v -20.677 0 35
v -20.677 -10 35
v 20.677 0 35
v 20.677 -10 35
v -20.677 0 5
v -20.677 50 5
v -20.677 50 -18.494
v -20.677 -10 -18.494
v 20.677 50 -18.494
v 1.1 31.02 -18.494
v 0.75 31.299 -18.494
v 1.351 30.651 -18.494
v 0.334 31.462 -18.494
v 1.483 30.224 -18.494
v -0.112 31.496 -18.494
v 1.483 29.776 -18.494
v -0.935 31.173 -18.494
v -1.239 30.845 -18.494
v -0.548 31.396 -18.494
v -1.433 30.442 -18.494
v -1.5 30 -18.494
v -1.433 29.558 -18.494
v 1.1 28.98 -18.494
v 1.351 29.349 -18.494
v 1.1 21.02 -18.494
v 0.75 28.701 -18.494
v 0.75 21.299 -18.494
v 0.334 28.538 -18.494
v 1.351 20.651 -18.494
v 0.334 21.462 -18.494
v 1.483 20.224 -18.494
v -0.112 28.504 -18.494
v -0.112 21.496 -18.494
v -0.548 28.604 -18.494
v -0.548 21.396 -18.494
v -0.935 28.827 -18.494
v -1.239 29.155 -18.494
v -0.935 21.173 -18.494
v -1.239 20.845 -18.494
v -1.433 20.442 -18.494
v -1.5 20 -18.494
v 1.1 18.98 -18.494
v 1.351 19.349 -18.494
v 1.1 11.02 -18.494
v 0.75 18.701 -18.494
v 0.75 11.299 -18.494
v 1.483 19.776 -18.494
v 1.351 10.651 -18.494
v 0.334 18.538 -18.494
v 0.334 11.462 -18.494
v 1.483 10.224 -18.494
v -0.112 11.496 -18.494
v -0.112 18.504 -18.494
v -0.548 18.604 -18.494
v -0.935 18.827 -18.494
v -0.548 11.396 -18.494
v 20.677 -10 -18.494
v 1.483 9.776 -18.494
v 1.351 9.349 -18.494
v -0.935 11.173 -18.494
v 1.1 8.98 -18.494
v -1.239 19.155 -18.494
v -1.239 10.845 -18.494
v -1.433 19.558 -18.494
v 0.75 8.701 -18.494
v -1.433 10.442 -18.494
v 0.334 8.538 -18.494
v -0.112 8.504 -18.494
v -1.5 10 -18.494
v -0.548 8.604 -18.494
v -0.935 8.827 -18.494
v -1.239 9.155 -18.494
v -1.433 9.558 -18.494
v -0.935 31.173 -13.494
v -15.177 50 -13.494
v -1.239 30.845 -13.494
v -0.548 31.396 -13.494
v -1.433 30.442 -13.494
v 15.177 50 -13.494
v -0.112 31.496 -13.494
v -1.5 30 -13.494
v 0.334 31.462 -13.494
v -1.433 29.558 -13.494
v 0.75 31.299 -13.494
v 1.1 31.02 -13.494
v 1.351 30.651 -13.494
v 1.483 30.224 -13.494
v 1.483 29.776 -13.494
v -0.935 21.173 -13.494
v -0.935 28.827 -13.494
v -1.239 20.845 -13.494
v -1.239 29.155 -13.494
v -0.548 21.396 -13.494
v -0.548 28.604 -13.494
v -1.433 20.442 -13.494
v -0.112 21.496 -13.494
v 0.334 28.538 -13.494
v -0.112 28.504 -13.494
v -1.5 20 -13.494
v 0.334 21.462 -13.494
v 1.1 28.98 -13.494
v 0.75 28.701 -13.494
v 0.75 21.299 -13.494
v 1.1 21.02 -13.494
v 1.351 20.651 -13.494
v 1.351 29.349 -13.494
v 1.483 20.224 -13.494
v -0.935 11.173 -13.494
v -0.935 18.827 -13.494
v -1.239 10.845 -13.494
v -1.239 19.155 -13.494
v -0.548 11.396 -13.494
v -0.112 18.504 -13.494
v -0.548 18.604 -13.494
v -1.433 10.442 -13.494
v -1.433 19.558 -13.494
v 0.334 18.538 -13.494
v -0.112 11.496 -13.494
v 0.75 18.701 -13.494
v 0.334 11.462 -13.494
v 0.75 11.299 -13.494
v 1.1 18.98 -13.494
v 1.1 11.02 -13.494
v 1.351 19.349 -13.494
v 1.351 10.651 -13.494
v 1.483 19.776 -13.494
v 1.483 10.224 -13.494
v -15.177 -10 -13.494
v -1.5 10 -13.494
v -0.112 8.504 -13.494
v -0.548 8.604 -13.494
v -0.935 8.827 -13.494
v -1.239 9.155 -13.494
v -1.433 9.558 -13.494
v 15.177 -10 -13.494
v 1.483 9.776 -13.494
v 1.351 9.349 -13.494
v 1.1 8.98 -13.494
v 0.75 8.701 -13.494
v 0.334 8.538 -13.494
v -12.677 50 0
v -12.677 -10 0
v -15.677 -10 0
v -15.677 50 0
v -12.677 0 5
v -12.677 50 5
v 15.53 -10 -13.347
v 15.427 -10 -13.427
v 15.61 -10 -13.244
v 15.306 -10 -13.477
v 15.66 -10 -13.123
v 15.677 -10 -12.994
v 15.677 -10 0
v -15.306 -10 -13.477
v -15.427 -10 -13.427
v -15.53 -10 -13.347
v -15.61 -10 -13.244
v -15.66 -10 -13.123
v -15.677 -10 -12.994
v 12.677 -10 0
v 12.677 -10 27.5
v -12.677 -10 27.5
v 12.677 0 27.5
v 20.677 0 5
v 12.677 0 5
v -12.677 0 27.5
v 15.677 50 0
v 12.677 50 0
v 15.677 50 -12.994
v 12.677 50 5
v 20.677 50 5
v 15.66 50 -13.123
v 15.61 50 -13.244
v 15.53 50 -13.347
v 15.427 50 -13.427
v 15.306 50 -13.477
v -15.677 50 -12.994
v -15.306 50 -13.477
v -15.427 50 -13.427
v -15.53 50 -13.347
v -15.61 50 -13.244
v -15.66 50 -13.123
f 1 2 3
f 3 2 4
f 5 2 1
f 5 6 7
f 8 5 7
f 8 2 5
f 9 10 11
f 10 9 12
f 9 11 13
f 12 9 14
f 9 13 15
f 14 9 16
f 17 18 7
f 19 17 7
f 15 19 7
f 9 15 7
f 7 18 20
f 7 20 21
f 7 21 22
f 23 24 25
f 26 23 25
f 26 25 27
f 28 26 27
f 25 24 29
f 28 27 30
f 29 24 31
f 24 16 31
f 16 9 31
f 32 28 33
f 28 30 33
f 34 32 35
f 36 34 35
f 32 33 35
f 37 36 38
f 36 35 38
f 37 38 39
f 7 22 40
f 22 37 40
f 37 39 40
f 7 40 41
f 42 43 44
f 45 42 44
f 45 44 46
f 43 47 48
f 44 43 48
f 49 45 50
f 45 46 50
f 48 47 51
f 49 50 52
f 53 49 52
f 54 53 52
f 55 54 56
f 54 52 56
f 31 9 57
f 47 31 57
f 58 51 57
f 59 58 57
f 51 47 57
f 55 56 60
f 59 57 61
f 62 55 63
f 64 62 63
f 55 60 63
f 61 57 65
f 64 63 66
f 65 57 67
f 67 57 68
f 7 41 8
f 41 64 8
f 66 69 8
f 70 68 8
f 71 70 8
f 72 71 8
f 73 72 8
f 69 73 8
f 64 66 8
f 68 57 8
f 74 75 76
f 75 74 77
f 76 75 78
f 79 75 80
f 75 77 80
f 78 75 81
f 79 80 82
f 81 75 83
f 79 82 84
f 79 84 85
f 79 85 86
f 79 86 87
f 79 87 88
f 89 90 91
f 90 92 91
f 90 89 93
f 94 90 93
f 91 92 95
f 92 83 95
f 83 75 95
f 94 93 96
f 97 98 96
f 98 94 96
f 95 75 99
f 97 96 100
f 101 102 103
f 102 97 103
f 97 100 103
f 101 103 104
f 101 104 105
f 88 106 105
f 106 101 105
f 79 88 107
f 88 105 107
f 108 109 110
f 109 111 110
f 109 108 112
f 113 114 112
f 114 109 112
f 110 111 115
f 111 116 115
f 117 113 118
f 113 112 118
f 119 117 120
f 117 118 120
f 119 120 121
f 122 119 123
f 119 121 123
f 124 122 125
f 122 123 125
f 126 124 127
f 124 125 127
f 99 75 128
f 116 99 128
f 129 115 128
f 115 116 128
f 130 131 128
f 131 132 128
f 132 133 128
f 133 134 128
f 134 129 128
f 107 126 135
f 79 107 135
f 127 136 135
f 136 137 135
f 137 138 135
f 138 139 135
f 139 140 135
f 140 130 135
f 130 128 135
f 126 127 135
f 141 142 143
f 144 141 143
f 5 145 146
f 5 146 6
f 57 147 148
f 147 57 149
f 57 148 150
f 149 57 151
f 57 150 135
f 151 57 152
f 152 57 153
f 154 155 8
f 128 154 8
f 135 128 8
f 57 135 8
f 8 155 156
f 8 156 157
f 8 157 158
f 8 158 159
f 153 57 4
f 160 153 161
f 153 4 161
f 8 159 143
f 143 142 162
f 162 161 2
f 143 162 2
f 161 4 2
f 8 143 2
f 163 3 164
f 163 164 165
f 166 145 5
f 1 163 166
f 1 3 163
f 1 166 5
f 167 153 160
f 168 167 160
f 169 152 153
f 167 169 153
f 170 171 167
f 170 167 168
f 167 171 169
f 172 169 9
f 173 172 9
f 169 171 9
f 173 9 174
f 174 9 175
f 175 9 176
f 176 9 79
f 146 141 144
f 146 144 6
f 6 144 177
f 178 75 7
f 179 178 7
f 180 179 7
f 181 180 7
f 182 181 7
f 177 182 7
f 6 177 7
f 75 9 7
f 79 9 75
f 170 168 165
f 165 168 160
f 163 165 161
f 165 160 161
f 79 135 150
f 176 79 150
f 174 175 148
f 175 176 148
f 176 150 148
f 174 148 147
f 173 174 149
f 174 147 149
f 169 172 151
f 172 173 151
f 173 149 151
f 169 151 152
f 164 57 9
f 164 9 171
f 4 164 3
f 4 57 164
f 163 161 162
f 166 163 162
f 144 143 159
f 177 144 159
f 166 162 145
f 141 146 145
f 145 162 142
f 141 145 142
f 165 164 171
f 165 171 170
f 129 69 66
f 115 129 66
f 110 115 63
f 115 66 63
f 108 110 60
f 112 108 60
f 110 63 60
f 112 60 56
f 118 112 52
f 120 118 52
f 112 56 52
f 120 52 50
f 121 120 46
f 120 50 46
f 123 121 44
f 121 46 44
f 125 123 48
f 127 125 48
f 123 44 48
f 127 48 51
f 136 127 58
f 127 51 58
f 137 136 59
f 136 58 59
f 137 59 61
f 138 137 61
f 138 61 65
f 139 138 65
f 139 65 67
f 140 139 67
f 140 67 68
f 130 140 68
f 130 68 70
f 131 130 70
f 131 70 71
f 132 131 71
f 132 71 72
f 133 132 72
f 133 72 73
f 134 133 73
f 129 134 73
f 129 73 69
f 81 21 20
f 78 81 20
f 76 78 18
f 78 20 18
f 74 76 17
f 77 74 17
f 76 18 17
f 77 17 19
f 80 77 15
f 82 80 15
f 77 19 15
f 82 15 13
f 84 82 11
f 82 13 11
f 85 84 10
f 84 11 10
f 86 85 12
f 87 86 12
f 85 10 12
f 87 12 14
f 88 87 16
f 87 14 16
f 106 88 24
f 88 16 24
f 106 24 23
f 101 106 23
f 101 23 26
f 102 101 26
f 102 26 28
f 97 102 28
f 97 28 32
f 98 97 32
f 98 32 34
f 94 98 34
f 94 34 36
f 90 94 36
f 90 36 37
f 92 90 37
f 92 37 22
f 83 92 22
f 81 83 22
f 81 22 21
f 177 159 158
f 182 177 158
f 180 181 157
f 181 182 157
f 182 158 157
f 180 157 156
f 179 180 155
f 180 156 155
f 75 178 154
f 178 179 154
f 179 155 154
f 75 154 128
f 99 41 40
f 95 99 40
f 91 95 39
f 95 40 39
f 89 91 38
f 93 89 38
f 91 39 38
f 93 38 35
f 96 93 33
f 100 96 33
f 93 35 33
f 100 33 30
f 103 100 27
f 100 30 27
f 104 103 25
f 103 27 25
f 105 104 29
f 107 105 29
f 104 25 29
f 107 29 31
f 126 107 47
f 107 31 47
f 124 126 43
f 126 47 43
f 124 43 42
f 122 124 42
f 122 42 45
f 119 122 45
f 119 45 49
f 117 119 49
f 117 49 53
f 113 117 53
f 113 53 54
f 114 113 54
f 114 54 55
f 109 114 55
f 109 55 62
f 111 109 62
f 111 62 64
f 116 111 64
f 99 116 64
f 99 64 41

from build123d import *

# Parameters (mm, degrees)
BOSS_EXTRUDE1_DEPTH = 50
BOSS_EXTRUDE2_START = 10
BOSS_EXTRUDE2_DEPTH = 10
CUT_EXTRUDE1_REACH  = 78.086
SKETCH3_R           = 1.5


with BuildPart() as part:
    # Sketch1 → Boss-Extrude1 (new body)
    with BuildSketch(Plane(origin=(0, 0, 0), x_dir=(1, 0, 0), z_dir=(0, 1, 0))):
        with BuildLine():
            Line((15.6765625, 0), (15.6765625, 12.99375))
            ThreePointArc((15.6765625, 12.99375), (15.530115891, 13.347303391), (15.1765625, 13.49375))
            Line((15.1765625, 13.49375), (-15.1765625, 13.49375))
            ThreePointArc((-15.1765625, 13.49375), (-15.530115891, 13.347303391), (-15.6765625, 12.99375))
            Line((-15.6765625, 12.99375), (-15.6765625, 0))
            Line((-15.6765625, 0), (-12.6765625, 0))
            Line((-12.6765625, 0), (-12.6765625, -5))
            Line((-12.6765625, -5), (-20.6765625, -5))
            Line((-20.6765625, -5), (-20.6765625, 0))
            Line((-20.6765625, 0), (-20.6765625, 18.49375))
            Line((-20.6765625, 18.49375), (20.6765625, 18.49375))
            Line((20.6765625, 18.49375), (20.6765625, 0))
            Line((20.6765625, 0), (20.6765625, -5))
            Line((20.6765625, -5), (12.6765625, -5))
            Line((12.6765625, -5), (12.6765625, 0))
            Line((12.6765625, 0), (15.6765625, 0))
        make_face()
    extrude(amount=BOSS_EXTRUDE1_DEPTH)

    # Sketch2 → Boss-Extrude2 (add)
    with BuildSketch(Plane.XZ.offset(BOSS_EXTRUDE2_START)):
        Polygon((-20.6765625, -18.49375), (-20.6765625, 5), (-20.6765625, 35), (20.6765625, 35), (20.6765625, 5), (20.6765625, -18.49375), align=None)
        with BuildLine():
            Line((-12.6765625, 5), (-12.6765625, 0))
            Line((-12.6765625, 0), (-15.6765625, 0))
            Line((-15.6765625, 0), (-15.6765625, -12.99375))
            ThreePointArc((-15.6765625, -12.99375), (-15.530115891, -13.347303391), (-15.1765625, -13.49375))
            Line((-15.1765625, -13.49375), (15.1765625, -13.49375))
            ThreePointArc((15.1765625, -13.49375), (15.530115891, -13.347303391), (15.6765625, -12.99375))
            Line((15.6765625, -12.99375), (15.6765625, 0))
            Line((15.6765625, 0), (12.6765625, 0))
            Line((12.6765625, 0), (12.6765625, 5))
            Line((12.6765625, 5), (12.6765625, 27.5))
            Line((12.6765625, 27.5), (-12.6765625, 27.5))
            Line((-12.6765625, 27.5), (-12.6765625, 5))
        make_face(mode=Mode.SUBTRACT)
    extrude(amount=-BOSS_EXTRUDE2_DEPTH)

    # Sketch3 → Cut-Extrude1 (cut, up to next)
    with BuildSketch(Plane(origin=(0, 0, -18.49375), x_dir=(-1, 0, 0), z_dir=(0, 0, -1)), mode=Mode.PRIVATE) as cut_extrude1_sk1:
        with Locations((0, 10)):
            Circle(SKETCH3_R)
    cut_extrude1_tool1 = extrude(cut_extrude1_sk1.sketch, amount=-CUT_EXTRUDE1_REACH, mode=Mode.PRIVATE) & part.part
    # Sketch3 → Cut-Extrude1 (cut, up to next)
    with BuildSketch(Plane(origin=(0, 0, -18.49375), x_dir=(-1, 0, 0), z_dir=(0, 0, -1)), mode=Mode.PRIVATE) as cut_extrude1_sk2:
        with Locations((0, 20)):
            Circle(SKETCH3_R)
    cut_extrude1_tool2 = extrude(cut_extrude1_sk2.sketch, amount=-CUT_EXTRUDE1_REACH, mode=Mode.PRIVATE) & part.part
    # Sketch3 → Cut-Extrude1 (cut, up to next)
    with BuildSketch(Plane(origin=(0, 0, -18.49375), x_dir=(-1, 0, 0), z_dir=(0, 0, -1)), mode=Mode.PRIVATE) as cut_extrude1_sk3:
        with Locations((0, 30)):
            Circle(SKETCH3_R)
    cut_extrude1_tool3 = extrude(cut_extrude1_sk3.sketch, amount=-CUT_EXTRUDE1_REACH, mode=Mode.PRIVATE) & part.part
    add(cut_extrude1_tool1.solids().sort_by_distance((0, 10, -18.49375))[0], mode=Mode.SUBTRACT)
    add(cut_extrude1_tool2.solids().sort_by_distance((0, 20, -18.49375))[0], mode=Mode.SUBTRACT)
    add(cut_extrude1_tool3.solids().sort_by_distance((0, 30, -18.49375))[0], mode=Mode.SUBTRACT)


solid = part.part
